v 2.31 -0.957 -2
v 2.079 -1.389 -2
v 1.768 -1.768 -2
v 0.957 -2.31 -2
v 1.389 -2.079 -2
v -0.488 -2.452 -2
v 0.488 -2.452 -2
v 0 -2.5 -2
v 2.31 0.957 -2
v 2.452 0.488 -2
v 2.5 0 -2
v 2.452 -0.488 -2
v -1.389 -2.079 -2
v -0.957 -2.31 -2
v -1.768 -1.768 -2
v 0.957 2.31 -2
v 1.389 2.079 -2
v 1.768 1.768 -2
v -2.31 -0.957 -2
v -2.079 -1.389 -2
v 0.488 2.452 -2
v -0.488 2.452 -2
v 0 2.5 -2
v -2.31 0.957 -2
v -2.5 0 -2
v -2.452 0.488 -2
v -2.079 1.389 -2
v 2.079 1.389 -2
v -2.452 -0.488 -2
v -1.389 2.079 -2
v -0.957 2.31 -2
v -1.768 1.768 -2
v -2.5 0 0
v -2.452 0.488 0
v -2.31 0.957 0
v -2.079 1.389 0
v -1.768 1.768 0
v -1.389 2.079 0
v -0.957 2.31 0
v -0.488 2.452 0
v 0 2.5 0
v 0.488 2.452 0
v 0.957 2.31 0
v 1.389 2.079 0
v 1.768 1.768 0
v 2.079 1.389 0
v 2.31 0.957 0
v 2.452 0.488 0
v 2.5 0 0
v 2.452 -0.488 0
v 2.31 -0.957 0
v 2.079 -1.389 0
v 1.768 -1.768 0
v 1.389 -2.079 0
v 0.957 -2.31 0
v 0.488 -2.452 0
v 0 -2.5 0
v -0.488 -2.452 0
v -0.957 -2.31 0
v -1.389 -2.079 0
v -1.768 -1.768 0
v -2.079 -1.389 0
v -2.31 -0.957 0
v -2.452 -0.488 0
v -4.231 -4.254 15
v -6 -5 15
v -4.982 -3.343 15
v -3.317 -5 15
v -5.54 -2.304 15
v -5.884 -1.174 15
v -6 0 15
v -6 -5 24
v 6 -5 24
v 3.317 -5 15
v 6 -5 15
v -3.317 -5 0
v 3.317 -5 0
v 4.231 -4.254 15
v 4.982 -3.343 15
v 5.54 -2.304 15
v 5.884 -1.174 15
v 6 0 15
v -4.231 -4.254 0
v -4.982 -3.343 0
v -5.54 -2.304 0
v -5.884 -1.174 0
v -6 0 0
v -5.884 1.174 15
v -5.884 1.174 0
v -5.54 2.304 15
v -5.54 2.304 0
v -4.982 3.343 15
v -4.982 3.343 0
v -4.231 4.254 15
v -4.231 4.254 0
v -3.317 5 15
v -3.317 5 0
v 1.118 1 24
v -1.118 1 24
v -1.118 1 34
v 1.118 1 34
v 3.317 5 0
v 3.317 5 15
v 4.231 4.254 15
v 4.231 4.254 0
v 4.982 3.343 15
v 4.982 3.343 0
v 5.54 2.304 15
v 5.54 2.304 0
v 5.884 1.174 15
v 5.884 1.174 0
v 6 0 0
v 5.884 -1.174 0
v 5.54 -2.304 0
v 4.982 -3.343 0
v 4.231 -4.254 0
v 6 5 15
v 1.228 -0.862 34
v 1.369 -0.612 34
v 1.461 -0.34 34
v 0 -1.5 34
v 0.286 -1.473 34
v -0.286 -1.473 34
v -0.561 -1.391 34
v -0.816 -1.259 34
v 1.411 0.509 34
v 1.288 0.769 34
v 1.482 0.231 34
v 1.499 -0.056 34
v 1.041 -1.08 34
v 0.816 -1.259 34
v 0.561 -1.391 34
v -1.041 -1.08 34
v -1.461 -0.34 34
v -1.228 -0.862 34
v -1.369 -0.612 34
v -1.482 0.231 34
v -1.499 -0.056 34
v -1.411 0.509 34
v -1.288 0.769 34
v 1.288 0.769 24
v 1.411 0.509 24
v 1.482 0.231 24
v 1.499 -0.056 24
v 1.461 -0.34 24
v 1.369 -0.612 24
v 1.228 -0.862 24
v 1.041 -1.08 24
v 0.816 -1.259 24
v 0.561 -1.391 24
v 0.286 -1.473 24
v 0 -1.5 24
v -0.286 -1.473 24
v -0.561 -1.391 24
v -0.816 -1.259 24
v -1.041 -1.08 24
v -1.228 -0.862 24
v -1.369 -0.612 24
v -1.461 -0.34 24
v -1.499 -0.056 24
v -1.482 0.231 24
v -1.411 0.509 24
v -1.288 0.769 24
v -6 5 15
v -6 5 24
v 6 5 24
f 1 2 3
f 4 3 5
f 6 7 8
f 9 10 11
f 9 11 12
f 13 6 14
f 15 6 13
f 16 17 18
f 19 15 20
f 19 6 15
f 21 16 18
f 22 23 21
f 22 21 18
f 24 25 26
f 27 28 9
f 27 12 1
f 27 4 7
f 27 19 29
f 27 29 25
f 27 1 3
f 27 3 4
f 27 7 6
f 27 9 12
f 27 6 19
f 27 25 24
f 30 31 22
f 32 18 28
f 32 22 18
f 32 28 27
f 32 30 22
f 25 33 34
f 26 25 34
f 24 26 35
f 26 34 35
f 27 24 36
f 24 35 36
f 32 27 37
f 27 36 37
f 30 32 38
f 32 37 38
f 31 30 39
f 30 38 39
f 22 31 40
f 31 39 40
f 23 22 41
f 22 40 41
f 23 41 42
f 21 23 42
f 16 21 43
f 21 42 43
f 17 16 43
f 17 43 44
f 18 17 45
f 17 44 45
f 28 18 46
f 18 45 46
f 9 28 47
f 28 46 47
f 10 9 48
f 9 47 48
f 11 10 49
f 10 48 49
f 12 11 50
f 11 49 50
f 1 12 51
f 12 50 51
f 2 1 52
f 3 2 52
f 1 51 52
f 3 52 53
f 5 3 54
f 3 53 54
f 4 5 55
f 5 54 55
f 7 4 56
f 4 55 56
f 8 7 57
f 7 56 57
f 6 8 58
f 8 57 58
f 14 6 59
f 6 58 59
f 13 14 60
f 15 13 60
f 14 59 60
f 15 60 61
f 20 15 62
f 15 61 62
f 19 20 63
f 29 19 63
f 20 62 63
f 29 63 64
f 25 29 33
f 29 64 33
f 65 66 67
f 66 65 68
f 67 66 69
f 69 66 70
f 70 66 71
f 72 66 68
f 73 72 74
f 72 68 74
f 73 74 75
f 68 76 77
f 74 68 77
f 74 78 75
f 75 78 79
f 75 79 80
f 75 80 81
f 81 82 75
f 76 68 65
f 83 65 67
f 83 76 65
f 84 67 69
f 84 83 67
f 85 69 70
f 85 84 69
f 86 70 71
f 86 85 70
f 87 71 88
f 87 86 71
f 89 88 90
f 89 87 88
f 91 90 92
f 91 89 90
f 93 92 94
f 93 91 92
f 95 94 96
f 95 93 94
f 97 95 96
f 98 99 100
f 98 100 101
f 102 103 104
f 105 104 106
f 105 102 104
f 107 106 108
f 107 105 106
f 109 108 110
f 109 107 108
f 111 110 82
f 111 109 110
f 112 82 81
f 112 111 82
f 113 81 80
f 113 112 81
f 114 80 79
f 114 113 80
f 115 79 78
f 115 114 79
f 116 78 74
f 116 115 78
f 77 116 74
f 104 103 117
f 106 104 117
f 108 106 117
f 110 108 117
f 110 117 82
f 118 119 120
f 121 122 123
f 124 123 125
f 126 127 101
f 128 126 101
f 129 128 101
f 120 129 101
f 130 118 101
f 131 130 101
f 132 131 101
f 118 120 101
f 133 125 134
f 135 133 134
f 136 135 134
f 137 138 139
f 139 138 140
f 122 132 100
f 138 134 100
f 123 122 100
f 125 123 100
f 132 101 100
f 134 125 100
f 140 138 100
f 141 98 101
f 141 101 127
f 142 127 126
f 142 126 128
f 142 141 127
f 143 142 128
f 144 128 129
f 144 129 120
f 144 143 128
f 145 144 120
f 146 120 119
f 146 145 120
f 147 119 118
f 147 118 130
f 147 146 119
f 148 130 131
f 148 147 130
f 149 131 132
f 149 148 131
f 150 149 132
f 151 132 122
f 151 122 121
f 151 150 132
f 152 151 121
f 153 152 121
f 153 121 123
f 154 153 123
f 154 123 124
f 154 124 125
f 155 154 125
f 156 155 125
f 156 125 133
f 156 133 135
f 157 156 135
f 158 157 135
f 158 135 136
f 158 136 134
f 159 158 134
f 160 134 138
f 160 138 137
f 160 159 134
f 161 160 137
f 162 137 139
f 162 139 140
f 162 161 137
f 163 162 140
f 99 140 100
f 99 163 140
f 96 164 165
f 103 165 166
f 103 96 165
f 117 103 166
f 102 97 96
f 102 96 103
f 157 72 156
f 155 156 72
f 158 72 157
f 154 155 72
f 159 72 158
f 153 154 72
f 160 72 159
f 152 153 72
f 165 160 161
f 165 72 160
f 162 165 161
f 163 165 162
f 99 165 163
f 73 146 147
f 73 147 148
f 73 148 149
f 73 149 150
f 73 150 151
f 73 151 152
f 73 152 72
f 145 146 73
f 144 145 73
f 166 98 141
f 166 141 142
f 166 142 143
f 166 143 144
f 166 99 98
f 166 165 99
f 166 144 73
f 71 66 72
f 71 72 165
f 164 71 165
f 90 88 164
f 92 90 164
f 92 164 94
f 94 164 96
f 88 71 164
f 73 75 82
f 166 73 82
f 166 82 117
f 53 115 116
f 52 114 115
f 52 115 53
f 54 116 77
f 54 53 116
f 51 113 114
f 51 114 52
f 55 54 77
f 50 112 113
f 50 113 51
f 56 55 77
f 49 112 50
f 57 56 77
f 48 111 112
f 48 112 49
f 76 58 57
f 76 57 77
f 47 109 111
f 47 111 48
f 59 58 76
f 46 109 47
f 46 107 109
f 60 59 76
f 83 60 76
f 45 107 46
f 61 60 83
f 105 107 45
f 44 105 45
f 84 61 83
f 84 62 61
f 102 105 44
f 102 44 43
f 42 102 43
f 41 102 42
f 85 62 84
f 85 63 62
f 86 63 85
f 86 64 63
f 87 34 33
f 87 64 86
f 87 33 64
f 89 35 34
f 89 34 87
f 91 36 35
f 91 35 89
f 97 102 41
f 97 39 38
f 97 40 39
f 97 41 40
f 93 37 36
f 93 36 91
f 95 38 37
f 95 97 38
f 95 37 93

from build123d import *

# Parameters (mm, degrees)
BOSS_EXTRUDE1_DEPTH = 15
ESQUISSE1_W         = 12
ESQUISSE1_H         = 10
BOSS_EXTRU_1_DEPTH  = 9
ESQUISSE2_R         = 2.5
BOSS_EXTRU_2_DEPTH  = 2
BOSS_EXTRUDE2_DEPTH = 10


with BuildPart() as part:
    # Sketch1 → Boss-Extrude1 (new body)
    with BuildSketch(Plane.XY):
        with BuildLine():
            Line((-3.31662479, 5), (3.31662479, 5))
            ThreePointArc((3.31662479, 5), (6, 0), (3.31662479, -5))
            Line((3.31662479, -5), (-3.31662479, -5))
            ThreePointArc((-3.31662479, -5), (-6, 0), (-3.31662479, 5))
        make_face()
    extrude(amount=BOSS_EXTRUDE1_DEPTH)

    # Esquisse1 → Boss.-Extru.1 (add)
    with BuildSketch(Plane.XY.offset(15)):
        Rectangle(ESQUISSE1_W, ESQUISSE1_H)
    extrude(amount=BOSS_EXTRU_1_DEPTH)

    # Esquisse2 → Boss.-Extru.2 (add)
    with BuildSketch(Plane(origin=(0, 0, 0), x_dir=(-1, 0, 0), z_dir=(0, 0, -1))):
        Circle(ESQUISSE2_R)
    extrude(amount=BOSS_EXTRU_2_DEPTH)

    # Sketch2 → Boss-Extrude2 (add)
    with BuildSketch(Plane.XY.offset(24)):
        with BuildLine():
            Line((-1.118033989, 1), (1.118033989, 1))
            ThreePointArc((1.118033989, 1), (0, -1.5), (-1.118033989, 1))
        make_face()
    extrude(amount=BOSS_EXTRUDE2_DEPTH)


solid = part.part
